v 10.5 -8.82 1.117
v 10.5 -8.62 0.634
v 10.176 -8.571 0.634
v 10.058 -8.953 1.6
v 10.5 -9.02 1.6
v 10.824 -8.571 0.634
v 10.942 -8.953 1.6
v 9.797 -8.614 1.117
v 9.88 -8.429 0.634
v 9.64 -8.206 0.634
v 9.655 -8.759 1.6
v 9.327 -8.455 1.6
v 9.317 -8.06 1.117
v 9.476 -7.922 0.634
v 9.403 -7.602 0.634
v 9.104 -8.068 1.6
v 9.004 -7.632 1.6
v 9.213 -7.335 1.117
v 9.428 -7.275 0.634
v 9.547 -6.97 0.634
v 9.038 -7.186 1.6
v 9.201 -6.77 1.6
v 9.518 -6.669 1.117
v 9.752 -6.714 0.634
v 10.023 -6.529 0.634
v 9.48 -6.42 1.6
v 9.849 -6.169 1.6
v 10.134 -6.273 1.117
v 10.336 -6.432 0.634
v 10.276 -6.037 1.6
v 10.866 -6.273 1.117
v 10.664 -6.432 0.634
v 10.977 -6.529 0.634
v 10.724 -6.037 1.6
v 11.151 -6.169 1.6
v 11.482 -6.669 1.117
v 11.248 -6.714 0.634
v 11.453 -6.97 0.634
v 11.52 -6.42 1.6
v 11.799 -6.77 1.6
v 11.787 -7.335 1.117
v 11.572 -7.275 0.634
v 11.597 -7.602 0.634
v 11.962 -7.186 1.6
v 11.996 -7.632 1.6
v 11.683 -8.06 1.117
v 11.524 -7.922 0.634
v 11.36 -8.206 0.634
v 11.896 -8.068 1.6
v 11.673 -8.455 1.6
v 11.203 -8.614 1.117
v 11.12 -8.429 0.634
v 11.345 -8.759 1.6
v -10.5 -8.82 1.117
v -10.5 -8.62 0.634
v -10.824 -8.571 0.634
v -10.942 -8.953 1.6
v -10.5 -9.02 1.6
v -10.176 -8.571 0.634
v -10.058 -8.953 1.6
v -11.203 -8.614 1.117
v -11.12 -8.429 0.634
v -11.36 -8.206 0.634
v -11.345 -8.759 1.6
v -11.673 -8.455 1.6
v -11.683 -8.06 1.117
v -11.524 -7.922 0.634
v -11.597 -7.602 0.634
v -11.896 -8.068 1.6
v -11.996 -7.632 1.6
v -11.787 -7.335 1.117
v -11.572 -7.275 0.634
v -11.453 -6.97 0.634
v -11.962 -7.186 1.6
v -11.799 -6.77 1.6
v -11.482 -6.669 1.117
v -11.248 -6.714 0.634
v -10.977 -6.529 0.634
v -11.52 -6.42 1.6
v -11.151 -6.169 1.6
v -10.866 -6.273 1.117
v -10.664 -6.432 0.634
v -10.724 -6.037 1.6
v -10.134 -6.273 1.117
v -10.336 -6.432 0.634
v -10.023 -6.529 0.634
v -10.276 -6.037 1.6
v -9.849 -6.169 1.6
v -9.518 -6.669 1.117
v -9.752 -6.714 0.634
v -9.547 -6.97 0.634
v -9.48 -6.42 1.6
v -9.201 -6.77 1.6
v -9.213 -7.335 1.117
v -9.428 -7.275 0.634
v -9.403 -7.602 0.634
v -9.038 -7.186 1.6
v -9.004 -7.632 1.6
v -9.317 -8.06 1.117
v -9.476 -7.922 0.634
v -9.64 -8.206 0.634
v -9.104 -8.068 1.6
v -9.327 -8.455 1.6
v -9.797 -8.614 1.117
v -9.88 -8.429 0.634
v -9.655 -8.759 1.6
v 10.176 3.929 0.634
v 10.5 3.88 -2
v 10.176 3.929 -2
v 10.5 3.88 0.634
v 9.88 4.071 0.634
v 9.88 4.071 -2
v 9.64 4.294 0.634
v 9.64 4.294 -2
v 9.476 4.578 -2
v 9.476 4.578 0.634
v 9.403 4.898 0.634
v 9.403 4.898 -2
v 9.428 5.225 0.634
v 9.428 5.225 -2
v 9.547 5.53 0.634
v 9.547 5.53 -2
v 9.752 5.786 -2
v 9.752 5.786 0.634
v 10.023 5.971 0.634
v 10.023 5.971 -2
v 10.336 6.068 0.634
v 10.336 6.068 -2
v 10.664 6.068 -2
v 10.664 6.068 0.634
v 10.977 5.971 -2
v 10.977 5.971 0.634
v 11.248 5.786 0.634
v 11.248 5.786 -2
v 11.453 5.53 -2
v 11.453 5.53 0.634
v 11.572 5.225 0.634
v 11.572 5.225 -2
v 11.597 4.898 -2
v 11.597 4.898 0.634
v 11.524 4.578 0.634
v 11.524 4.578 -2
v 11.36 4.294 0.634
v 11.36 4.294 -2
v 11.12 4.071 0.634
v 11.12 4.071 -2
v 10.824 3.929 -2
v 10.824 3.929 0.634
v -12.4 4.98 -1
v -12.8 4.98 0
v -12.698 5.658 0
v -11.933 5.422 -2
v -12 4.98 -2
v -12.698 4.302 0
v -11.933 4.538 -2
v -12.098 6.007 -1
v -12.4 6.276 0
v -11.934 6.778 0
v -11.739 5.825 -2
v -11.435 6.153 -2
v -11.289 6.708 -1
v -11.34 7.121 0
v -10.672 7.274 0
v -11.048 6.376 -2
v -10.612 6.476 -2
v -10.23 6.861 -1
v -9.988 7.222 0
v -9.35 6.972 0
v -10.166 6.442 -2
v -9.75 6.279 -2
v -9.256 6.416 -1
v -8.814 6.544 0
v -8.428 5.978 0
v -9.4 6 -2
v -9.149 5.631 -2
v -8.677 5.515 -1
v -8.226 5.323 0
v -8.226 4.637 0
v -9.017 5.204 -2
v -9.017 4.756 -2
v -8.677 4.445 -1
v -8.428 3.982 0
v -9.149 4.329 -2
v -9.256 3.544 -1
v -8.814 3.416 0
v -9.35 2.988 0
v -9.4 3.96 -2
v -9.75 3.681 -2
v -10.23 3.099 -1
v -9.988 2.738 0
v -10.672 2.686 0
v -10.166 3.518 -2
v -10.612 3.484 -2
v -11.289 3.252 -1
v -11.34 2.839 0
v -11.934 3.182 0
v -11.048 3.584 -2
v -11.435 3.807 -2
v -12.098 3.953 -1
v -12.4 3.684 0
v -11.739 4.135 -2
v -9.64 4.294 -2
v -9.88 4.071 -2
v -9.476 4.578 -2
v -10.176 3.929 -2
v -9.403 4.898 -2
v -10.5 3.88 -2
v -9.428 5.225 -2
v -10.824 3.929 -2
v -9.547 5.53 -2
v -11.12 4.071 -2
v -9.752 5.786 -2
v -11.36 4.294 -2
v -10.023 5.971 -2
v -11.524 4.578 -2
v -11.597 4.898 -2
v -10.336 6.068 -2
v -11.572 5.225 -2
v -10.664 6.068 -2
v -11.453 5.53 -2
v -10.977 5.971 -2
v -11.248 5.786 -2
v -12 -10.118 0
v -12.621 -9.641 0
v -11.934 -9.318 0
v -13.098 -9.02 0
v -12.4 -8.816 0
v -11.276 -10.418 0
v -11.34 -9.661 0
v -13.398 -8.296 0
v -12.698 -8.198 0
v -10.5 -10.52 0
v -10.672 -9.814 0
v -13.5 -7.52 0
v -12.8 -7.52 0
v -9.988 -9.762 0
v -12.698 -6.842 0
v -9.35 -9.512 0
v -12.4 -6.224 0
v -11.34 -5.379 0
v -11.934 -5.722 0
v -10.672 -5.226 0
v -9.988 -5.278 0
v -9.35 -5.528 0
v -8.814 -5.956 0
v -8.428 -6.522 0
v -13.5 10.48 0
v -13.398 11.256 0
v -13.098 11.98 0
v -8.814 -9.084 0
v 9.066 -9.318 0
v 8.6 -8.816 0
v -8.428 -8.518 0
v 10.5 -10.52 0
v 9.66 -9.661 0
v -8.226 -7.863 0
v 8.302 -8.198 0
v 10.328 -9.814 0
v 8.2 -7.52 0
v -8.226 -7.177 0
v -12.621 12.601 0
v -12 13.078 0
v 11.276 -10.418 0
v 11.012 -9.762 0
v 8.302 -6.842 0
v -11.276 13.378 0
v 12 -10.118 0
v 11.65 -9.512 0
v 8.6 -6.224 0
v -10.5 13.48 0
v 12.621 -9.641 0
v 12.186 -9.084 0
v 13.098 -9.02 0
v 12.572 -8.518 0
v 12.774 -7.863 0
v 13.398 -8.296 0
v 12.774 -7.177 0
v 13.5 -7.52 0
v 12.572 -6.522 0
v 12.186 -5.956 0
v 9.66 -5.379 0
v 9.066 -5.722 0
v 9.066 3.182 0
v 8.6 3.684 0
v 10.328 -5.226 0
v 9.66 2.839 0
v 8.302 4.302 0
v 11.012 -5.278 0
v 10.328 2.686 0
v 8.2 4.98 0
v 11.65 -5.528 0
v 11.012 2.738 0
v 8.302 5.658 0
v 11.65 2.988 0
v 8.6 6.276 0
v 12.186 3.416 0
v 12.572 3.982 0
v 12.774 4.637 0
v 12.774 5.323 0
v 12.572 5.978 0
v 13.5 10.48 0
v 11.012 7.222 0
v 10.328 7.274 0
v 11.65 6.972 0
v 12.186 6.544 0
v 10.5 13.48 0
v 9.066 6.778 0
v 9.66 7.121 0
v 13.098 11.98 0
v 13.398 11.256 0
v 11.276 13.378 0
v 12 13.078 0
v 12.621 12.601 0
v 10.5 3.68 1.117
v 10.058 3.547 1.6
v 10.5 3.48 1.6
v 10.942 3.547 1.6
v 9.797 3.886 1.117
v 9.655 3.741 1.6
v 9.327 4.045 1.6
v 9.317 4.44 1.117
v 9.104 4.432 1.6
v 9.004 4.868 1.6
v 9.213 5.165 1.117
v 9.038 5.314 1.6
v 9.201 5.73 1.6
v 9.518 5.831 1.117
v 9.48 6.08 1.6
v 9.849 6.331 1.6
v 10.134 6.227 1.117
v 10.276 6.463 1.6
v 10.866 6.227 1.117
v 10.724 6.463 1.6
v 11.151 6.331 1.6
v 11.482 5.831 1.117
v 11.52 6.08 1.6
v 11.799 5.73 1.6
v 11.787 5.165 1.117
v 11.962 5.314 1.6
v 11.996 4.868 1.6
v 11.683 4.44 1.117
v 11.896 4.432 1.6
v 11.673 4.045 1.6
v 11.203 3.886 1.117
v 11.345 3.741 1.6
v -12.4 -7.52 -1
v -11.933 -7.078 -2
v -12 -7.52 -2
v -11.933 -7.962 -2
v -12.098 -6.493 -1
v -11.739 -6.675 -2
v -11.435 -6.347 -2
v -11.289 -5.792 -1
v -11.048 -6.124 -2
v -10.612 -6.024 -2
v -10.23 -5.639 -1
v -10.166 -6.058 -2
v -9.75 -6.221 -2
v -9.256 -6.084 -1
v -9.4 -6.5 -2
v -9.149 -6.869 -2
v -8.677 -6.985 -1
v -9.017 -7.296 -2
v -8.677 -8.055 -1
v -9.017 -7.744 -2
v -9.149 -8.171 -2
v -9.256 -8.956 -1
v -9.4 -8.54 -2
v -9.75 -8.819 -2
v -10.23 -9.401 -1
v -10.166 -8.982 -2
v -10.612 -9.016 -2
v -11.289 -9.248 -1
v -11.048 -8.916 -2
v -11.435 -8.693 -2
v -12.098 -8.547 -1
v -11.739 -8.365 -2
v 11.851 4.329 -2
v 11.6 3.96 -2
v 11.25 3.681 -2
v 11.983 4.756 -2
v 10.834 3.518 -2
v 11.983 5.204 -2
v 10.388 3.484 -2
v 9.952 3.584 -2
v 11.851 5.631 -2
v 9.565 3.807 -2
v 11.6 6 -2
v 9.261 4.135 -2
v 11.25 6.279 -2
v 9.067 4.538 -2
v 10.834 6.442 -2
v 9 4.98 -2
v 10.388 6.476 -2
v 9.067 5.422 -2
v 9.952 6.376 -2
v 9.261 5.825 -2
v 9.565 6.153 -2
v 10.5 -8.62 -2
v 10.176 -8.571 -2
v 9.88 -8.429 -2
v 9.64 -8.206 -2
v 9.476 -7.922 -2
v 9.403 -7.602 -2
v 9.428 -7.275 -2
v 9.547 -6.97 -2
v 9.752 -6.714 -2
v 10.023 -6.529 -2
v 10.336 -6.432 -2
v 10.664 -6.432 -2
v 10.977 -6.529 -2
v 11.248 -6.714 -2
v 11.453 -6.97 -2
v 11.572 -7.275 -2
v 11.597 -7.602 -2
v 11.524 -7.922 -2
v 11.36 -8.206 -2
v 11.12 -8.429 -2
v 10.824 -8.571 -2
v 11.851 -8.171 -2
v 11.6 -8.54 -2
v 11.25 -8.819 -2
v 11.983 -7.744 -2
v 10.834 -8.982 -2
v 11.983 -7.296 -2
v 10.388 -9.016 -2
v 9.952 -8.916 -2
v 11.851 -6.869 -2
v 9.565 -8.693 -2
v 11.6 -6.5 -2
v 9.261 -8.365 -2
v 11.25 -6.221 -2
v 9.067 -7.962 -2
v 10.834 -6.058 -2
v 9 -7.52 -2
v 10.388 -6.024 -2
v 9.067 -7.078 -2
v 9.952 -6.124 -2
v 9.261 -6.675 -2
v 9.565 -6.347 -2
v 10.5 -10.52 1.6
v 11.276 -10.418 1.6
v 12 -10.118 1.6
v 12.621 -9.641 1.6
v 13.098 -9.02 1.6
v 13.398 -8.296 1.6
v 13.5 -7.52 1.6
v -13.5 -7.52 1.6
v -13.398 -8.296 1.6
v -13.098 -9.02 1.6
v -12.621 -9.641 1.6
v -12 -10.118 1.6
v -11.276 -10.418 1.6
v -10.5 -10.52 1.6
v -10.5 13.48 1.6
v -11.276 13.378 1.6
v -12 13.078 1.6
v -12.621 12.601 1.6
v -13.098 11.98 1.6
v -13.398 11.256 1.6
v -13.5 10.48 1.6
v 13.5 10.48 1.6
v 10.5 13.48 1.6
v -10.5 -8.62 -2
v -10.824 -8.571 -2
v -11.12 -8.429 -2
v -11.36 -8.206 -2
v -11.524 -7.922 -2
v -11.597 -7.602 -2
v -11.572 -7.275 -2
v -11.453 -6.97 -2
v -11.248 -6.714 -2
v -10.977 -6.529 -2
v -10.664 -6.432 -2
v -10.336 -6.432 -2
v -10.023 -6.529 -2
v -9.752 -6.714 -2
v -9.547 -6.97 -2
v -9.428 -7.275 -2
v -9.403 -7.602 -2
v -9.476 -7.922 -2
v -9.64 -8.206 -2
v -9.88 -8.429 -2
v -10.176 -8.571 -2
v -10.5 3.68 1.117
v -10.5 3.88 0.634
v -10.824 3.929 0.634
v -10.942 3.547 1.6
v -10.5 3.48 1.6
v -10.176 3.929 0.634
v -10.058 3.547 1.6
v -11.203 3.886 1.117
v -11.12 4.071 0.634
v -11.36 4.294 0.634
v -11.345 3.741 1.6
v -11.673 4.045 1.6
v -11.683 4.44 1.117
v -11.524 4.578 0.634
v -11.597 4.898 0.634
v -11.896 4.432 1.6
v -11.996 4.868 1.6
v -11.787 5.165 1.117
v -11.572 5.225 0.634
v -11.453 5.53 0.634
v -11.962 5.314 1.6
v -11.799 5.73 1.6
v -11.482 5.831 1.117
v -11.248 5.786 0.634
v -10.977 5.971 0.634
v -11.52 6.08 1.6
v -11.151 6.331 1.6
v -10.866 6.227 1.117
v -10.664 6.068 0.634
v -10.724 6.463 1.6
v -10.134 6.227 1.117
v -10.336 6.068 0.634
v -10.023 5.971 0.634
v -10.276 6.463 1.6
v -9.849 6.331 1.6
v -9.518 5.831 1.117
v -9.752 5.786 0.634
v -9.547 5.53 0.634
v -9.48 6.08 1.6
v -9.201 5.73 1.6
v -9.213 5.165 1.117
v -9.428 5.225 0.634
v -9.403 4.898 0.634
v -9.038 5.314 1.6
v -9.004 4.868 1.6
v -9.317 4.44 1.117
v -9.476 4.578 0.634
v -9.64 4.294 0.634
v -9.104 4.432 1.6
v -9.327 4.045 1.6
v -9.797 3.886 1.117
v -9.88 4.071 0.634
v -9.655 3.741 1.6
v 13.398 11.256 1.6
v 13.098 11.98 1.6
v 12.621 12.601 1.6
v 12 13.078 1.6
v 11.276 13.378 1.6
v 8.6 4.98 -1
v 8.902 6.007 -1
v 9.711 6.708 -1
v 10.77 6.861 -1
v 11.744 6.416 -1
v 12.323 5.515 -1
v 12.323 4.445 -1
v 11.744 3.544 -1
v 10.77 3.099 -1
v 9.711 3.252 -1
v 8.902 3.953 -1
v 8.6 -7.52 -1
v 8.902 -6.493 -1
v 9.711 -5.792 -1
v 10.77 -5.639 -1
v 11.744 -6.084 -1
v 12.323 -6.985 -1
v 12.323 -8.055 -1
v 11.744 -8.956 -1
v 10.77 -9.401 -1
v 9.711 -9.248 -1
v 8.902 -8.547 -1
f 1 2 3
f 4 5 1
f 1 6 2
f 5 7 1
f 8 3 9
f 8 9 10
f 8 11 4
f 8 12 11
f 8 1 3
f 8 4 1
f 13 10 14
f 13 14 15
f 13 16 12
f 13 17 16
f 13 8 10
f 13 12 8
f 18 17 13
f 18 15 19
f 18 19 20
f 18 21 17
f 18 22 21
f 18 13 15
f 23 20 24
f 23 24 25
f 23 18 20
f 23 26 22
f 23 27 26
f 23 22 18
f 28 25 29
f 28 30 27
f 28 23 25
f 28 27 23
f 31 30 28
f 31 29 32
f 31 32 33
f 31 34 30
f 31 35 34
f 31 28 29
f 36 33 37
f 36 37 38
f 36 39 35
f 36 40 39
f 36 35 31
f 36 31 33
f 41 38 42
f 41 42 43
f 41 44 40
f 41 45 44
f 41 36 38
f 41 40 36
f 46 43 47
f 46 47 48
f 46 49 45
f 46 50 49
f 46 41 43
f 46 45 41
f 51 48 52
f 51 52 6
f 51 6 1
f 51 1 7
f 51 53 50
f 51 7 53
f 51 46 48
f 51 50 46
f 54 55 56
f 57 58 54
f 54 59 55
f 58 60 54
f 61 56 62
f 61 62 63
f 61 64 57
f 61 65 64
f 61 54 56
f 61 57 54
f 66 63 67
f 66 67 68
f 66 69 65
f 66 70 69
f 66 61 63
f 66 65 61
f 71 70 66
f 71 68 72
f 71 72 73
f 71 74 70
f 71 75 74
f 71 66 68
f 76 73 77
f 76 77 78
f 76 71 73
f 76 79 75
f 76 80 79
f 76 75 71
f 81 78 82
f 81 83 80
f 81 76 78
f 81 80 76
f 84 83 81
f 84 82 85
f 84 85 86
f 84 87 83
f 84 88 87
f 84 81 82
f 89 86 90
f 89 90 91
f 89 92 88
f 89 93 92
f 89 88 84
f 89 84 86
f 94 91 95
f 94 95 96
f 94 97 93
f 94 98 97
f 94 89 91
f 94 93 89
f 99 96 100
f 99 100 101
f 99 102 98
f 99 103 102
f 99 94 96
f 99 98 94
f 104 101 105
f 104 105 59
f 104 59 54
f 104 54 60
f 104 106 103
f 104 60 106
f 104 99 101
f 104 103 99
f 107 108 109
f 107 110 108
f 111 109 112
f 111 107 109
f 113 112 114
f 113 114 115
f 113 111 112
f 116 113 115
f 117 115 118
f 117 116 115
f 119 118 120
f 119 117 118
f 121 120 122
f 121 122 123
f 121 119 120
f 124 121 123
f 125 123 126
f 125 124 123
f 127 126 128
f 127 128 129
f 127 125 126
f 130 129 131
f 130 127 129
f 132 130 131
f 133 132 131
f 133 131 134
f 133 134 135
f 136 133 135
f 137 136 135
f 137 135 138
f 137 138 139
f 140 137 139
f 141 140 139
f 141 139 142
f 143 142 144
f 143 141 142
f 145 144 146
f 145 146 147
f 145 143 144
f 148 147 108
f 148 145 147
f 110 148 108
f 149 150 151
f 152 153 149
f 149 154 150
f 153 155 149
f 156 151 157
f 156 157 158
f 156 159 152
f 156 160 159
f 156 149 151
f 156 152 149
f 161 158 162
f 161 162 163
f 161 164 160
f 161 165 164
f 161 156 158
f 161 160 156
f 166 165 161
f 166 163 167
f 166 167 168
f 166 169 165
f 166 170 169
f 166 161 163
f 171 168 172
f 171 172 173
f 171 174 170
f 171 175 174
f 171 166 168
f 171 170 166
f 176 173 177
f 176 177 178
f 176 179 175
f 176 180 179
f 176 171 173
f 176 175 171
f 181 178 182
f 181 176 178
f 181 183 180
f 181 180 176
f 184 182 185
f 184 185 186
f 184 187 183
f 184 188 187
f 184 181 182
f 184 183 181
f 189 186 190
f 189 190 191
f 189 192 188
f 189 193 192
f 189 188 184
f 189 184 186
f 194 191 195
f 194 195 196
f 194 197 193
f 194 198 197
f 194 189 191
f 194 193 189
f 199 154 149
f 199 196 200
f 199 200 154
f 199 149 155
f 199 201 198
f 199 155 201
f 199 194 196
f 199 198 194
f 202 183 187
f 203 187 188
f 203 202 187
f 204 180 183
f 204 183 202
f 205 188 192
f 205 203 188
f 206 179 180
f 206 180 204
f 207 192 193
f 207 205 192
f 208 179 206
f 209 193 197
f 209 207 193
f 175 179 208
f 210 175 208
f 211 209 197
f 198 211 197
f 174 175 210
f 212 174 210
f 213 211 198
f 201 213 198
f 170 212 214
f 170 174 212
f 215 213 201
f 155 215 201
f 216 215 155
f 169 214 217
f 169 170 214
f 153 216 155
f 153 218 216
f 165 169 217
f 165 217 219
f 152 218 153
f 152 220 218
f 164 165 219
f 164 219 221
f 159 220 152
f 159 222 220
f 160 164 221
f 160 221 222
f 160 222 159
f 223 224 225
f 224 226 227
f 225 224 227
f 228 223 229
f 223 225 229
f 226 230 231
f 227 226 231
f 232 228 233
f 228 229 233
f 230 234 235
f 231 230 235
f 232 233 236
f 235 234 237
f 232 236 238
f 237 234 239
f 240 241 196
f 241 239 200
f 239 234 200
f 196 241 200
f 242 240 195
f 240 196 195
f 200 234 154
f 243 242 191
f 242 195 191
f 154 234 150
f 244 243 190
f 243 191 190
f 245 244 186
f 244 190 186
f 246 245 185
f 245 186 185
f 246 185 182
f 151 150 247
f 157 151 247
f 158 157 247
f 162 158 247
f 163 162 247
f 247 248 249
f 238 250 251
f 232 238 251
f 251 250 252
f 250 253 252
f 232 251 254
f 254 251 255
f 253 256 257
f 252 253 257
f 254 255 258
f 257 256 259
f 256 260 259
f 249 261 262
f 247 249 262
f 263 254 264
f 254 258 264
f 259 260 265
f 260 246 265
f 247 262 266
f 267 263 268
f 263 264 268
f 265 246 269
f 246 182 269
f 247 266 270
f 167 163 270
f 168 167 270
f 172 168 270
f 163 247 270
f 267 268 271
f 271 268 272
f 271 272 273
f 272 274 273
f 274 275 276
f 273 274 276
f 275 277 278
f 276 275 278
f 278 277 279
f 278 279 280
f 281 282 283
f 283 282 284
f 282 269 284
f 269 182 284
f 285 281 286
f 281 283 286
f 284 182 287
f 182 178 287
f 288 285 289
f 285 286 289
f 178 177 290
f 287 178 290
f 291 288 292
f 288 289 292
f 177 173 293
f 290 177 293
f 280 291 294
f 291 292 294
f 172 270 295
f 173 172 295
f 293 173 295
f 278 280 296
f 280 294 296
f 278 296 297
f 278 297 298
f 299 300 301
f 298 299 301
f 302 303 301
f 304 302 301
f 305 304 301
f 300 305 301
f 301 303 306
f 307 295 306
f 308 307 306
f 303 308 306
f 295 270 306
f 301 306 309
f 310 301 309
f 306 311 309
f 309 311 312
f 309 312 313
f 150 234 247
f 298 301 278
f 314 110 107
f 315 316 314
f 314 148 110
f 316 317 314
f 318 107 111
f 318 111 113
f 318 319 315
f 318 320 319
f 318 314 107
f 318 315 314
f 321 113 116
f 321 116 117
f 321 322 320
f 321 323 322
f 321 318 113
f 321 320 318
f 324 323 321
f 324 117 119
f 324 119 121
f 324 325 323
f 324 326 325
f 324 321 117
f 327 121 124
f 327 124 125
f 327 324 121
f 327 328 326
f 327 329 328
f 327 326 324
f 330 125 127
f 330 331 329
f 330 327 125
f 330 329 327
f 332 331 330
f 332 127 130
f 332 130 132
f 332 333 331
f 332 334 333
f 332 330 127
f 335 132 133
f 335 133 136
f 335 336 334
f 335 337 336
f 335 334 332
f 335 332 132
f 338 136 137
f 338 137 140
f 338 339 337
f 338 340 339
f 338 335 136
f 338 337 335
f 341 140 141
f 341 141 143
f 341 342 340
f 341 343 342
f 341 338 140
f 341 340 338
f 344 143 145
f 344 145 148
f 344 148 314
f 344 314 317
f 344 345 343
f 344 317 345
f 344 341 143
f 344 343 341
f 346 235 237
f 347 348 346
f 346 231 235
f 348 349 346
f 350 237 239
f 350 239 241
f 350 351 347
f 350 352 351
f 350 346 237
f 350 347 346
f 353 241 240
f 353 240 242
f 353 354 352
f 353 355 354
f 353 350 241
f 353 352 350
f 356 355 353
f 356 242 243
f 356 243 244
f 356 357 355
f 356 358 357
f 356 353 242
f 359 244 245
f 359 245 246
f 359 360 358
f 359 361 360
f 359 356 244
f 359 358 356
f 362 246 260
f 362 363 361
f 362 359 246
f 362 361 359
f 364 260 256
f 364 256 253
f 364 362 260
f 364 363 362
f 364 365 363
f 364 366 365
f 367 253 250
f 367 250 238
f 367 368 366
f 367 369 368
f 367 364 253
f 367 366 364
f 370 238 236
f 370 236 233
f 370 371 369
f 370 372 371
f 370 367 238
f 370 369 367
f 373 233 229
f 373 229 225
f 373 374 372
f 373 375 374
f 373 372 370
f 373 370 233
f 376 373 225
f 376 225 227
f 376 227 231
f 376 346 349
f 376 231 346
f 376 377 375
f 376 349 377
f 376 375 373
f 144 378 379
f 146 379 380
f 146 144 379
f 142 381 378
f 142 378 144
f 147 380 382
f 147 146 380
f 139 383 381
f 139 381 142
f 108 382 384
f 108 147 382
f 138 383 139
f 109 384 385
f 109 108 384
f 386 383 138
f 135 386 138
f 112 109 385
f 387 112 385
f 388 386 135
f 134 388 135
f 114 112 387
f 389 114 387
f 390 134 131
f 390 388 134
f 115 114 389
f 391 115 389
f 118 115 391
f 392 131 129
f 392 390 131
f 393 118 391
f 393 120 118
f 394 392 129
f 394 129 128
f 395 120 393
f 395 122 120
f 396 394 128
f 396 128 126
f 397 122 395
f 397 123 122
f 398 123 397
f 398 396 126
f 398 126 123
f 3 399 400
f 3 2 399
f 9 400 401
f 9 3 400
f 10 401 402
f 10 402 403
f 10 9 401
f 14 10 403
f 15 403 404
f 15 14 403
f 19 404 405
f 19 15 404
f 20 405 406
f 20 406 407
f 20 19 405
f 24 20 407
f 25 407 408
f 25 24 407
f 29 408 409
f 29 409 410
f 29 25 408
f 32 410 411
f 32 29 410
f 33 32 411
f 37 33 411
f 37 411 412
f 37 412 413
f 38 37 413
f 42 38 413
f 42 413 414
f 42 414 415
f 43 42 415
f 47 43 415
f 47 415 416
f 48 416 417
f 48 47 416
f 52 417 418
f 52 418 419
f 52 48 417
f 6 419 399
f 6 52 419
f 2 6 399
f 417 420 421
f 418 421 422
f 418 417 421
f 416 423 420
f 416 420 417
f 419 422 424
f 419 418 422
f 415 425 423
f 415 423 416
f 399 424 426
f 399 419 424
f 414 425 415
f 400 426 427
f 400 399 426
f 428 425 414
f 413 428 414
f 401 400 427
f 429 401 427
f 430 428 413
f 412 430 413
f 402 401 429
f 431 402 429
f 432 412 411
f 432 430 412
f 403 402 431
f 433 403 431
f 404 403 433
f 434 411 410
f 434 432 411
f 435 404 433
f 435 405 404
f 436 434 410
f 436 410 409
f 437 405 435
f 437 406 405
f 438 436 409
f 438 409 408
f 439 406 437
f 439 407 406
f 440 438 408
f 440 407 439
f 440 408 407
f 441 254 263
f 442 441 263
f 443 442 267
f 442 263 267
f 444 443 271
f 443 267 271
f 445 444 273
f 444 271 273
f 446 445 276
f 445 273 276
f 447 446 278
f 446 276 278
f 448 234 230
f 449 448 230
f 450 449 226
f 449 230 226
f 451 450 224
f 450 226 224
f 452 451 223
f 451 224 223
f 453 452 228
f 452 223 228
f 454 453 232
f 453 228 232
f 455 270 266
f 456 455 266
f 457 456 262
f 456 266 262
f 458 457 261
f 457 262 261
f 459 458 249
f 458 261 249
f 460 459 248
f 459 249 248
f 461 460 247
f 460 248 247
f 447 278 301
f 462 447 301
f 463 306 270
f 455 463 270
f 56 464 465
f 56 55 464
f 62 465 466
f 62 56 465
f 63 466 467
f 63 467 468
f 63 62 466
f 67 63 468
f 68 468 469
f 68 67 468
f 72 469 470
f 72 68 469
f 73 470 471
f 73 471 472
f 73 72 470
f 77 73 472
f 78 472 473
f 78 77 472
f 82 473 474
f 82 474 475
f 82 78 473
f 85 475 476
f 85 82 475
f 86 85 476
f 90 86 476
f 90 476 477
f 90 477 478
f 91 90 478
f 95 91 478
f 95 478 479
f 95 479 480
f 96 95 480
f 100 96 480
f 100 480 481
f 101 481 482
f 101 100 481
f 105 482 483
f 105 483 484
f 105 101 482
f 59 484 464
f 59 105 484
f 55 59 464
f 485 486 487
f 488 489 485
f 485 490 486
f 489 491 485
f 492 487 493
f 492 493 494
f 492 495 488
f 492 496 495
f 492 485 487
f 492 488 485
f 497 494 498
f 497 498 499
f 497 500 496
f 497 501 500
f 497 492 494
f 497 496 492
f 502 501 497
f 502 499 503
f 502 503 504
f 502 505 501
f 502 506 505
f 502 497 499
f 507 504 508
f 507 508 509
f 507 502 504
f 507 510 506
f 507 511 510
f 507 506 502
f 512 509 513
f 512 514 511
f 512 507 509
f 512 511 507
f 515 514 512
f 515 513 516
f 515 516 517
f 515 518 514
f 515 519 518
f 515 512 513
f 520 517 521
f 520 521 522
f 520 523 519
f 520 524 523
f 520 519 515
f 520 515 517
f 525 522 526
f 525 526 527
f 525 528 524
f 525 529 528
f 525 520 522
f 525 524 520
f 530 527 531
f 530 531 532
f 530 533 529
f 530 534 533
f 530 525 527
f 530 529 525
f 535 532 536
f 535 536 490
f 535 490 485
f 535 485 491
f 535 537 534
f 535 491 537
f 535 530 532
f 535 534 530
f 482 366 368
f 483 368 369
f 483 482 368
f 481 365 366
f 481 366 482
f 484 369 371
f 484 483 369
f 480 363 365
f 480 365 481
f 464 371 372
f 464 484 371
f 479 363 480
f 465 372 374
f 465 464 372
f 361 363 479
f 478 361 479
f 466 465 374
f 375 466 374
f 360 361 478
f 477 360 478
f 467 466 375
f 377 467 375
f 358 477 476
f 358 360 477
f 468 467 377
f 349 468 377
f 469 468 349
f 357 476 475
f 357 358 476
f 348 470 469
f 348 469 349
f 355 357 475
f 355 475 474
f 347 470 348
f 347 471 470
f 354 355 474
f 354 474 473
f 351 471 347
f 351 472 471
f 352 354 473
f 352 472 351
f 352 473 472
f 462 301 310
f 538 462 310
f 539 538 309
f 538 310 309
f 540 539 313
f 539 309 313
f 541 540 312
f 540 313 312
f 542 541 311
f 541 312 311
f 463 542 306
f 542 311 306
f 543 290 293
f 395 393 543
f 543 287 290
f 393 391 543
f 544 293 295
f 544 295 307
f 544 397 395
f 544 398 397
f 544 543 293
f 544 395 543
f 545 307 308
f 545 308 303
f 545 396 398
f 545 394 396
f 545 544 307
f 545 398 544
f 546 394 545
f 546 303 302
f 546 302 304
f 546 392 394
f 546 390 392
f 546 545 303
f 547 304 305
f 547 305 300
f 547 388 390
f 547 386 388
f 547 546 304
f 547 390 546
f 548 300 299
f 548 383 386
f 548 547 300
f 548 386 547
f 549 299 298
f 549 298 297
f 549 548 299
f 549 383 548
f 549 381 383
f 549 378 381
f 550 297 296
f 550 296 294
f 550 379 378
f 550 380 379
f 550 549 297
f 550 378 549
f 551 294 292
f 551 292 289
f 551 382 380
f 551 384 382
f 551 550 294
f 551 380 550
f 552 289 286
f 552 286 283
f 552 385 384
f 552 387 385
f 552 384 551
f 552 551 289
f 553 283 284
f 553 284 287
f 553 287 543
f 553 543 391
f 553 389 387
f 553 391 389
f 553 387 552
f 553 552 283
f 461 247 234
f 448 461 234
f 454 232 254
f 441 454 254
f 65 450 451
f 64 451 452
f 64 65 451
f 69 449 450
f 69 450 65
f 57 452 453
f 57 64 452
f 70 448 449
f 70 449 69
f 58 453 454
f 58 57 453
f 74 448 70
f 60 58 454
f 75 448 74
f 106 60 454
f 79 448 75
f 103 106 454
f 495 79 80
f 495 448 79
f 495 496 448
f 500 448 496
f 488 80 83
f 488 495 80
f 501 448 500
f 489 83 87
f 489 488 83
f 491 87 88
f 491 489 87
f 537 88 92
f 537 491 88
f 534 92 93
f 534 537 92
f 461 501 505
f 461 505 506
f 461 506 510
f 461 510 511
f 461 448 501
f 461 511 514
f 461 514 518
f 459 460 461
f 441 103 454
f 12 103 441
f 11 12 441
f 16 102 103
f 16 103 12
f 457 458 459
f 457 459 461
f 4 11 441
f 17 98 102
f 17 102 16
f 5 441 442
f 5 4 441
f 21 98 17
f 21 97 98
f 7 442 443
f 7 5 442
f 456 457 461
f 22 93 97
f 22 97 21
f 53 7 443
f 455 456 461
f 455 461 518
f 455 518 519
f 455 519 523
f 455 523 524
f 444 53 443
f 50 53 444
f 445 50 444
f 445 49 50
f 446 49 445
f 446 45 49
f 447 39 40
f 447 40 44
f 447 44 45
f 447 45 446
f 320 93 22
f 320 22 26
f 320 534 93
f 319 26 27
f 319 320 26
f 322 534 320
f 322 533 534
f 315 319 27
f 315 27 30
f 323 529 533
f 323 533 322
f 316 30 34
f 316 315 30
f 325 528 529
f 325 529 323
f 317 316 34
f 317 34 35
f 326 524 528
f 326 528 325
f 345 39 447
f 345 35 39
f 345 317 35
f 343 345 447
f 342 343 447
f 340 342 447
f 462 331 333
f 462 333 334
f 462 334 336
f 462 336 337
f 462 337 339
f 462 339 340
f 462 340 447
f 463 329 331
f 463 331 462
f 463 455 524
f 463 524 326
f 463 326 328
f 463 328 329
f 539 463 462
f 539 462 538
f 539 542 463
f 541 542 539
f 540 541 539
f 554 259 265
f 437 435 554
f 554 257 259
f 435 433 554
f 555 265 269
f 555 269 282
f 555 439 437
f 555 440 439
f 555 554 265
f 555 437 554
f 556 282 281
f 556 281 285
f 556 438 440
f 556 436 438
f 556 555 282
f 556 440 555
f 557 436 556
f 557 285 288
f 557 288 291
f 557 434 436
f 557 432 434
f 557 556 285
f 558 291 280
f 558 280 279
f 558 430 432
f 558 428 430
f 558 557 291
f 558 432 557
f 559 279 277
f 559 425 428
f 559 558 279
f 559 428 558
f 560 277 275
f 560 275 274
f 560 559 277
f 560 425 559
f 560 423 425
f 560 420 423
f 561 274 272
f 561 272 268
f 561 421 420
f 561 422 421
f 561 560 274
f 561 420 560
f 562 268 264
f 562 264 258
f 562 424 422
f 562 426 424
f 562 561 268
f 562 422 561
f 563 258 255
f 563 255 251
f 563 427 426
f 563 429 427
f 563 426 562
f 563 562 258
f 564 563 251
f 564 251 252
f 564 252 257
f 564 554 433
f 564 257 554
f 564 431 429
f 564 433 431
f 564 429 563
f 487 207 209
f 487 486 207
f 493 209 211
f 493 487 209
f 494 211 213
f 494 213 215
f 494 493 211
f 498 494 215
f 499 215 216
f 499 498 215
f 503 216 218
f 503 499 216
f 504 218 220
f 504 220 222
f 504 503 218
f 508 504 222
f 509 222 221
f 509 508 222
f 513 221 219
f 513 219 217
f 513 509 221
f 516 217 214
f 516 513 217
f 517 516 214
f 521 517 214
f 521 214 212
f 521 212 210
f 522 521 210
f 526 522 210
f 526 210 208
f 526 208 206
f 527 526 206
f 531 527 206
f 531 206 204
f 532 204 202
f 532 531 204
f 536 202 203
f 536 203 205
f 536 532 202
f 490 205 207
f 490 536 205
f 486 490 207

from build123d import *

# Parameters (mm, degrees)
BOSS_EXTRUDE1_DEPTH           = 1.6
SKETCH4_R                     = 2.3
BOSS_EXTRUDE2_DEPTH           = 2
M2_CLEARANCE_HOLE1_AT_2_COUNT = 2
M2_CLEARANCE_HOLE1_AT_2_PITCH = 12.5
M2_CLEARANCE_HOLE1_AT_3_COUNT = 2
M2_CLEARANCE_HOLE1_AT_3_PITCH = 24.43869882
M2_CLEARANCE_HOLE1_AT_4_COUNT = 2
M2_CLEARANCE_HOLE1_AT_4_PITCH = 21
CHAMFER1_SIZE                 = 2
CHAMFER1_SIZE_2               = 0.8


with BuildPart() as part:
    # Sketch1 → Boss-Extrude1 (new body)
    with BuildSketch(Plane.XY):
        with BuildLine():
            Line((10.50000068, 13.480003898), (-10.50000068, 13.480003898))
            ThreePointArc((-10.50000068, 13.480003898), (-12.621321024, 12.601324241), (-13.50000068, 10.480003898))
            Line((-13.50000068, 10.480003898), (-13.50000068, -7.519996102))
            ThreePointArc((-13.50000068, -7.519996102), (-12.621321024, -9.641316446), (-10.50000068, -10.519996102))
            Line((-10.50000068, -10.519996102), (10.50000068, -10.519996102))
            ThreePointArc((10.50000068, -10.519996102), (12.621321024, -9.641316446), (13.50000068, -7.519996102))
            Line((13.50000068, -7.519996102), (13.50000068, 10.480003898))
            ThreePointArc((13.50000068, 10.480003898), (12.621321024, 12.601324241), (10.50000068, 13.480003898))
        make_face()
    extrude(amount=BOSS_EXTRUDE1_DEPTH)

    # Sketch4 → Boss-Extrude2 (add)
    with BuildSketch(Plane(origin=(0, 0, 0), x_dir=(-1, 0, 0), z_dir=(0, 0, -1))):
        with Locations((-10.500001265, 4.980003898)):
            Circle(SKETCH4_R)
        with Locations((10.499998735, 4.98000488)):
            Circle(SKETCH4_R)
        with Locations((10.50000068, -7.519996102)):
            Circle(SKETCH4_R)
        with Locations((-10.50000068, -7.519996102)):
            Circle(SKETCH4_R)
    extrude(amount=BOSS_EXTRUDE2_DEPTH)

    # Sketch3 → M2 Clearance Hole1 (revolve, cut)
    with BuildSketch(Plane(origin=(10.500001265, 4.980003898, 1.6), x_dir=(0, -1, 0), z_dir=(1, 0, 0))):
        Polygon((0, 0), (0, 3.6), (1.1, 3.6), (1.1, 0.965685425), (1.5, 0), align=None)
    m2_clearance_hole1 = revolve(axis=Axis((10.500001265, 4.980003898, 7.95), (0, 0, -1)), mode=Mode.SUBTRACT)

    # M2 Clearance Hole1 at 2: M2 Clearance Hole1 ×2
    with Locations(*[(0, -i * M2_CLEARANCE_HOLE1_AT_2_PITCH, 0) for i in range(1, M2_CLEARANCE_HOLE1_AT_2_COUNT)]):
        add(m2_clearance_hole1, mode=Mode.SUBTRACT)

    # M2 Clearance Hole1 at 3: M2 Clearance Hole1 ×2
    with Locations(*[Vector(-0.8592929083374752, -0.5114838195690296, 0) * (i * M2_CLEARANCE_HOLE1_AT_3_PITCH) for i in range(1, M2_CLEARANCE_HOLE1_AT_3_COUNT)]):
        add(m2_clearance_hole1, mode=Mode.SUBTRACT)

    # M2 Clearance Hole1 at 4: M2 Clearance Hole1 ×2
    with Locations(*[(-i * M2_CLEARANCE_HOLE1_AT_4_PITCH, 0, 0) for i in range(1, M2_CLEARANCE_HOLE1_AT_4_COUNT)]):
        add(m2_clearance_hole1, mode=Mode.SUBTRACT)

    # Chamfer1
    # the kernel refuses this chamfer: 2, 0.8 mm, written as the material it takes off along each edge
    with BuildSketch(Plane(origin=(10.500001265, 4.980003898, -2), x_dir=(-1, 0, 0), z_dir=(0, -1, 0))) as chamfer1_piece_1_section:
        Polygon((2.3, -CHAMFER1_SIZE), (2.3 - CHAMFER1_SIZE_2, 0), (2.3, 0), align=None)
    chamfer1_piece_1 = revolve(axis=Axis((10.500001265, 4.980003898, -2), (0, 0, -1)), mode=Mode.PRIVATE)
    chamfer1_piece_1 = split(chamfer1_piece_1, bisect_by=Plane(origin=(12.406400558, 4.980003898, 0), z_dir=(0, 0, -1)), keep=Keep.TOP, mode=Mode.PRIVATE)
    add(chamfer1_piece_1, mode=Mode.SUBTRACT)
    with BuildSketch(Plane(origin=(-10.499998735, 4.98000488, -2), x_dir=(-1, 0, 0), z_dir=(0, -1, 0))) as chamfer1_piece_2_section:
        Polygon((2.3, -CHAMFER1_SIZE), (2.3 - CHAMFER1_SIZE_2, 0), (2.3, 0), align=None)
    chamfer1_piece_2 = revolve(axis=Axis((-10.499998735, 4.98000488, -2), (0, 0, -1)), mode=Mode.PRIVATE)
    chamfer1_piece_2 = split(chamfer1_piece_2, bisect_by=Plane(origin=(-8.593599442, 4.98000488, 0), z_dir=(0, 0, -1)), keep=Keep.TOP, mode=Mode.PRIVATE)
    add(chamfer1_piece_2, mode=Mode.SUBTRACT)
    with BuildSketch(Plane(origin=(-10.50000068, -7.519996102, -2), x_dir=(-1, 0, 0), z_dir=(0, -1, 0))) as chamfer1_piece_3_section:
        Polygon((2.3, -CHAMFER1_SIZE), (2.3 - CHAMFER1_SIZE_2, 0), (2.3, 0), align=None)
    chamfer1_piece_3 = revolve(axis=Axis((-10.50000068, -7.519996102, -2), (0, 0, -1)), mode=Mode.PRIVATE)
    chamfer1_piece_3 = split(chamfer1_piece_3, bisect_by=Plane(origin=(-8.593601387, -7.519996102, 0), z_dir=(0, 0, -1)), keep=Keep.TOP, mode=Mode.PRIVATE)
    add(chamfer1_piece_3, mode=Mode.SUBTRACT)
    with BuildSketch(Plane(origin=(10.50000068, -7.519996102, -2), x_dir=(-1, 0, 0), z_dir=(0, -1, 0))) as chamfer1_piece_4_section:
        Polygon((2.3, -CHAMFER1_SIZE), (2.3 - CHAMFER1_SIZE_2, 0), (2.3, 0), align=None)
    chamfer1_piece_4 = revolve(axis=Axis((10.50000068, -7.519996102, -2), (0, 0, -1)), mode=Mode.PRIVATE)
    chamfer1_piece_4 = split(chamfer1_piece_4, bisect_by=Plane(origin=(12.406399973, -7.519996102, 0), z_dir=(0, 0, -1)), keep=Keep.TOP, mode=Mode.PRIVATE)
    add(chamfer1_piece_4, mode=Mode.SUBTRACT)


solid = part.part
